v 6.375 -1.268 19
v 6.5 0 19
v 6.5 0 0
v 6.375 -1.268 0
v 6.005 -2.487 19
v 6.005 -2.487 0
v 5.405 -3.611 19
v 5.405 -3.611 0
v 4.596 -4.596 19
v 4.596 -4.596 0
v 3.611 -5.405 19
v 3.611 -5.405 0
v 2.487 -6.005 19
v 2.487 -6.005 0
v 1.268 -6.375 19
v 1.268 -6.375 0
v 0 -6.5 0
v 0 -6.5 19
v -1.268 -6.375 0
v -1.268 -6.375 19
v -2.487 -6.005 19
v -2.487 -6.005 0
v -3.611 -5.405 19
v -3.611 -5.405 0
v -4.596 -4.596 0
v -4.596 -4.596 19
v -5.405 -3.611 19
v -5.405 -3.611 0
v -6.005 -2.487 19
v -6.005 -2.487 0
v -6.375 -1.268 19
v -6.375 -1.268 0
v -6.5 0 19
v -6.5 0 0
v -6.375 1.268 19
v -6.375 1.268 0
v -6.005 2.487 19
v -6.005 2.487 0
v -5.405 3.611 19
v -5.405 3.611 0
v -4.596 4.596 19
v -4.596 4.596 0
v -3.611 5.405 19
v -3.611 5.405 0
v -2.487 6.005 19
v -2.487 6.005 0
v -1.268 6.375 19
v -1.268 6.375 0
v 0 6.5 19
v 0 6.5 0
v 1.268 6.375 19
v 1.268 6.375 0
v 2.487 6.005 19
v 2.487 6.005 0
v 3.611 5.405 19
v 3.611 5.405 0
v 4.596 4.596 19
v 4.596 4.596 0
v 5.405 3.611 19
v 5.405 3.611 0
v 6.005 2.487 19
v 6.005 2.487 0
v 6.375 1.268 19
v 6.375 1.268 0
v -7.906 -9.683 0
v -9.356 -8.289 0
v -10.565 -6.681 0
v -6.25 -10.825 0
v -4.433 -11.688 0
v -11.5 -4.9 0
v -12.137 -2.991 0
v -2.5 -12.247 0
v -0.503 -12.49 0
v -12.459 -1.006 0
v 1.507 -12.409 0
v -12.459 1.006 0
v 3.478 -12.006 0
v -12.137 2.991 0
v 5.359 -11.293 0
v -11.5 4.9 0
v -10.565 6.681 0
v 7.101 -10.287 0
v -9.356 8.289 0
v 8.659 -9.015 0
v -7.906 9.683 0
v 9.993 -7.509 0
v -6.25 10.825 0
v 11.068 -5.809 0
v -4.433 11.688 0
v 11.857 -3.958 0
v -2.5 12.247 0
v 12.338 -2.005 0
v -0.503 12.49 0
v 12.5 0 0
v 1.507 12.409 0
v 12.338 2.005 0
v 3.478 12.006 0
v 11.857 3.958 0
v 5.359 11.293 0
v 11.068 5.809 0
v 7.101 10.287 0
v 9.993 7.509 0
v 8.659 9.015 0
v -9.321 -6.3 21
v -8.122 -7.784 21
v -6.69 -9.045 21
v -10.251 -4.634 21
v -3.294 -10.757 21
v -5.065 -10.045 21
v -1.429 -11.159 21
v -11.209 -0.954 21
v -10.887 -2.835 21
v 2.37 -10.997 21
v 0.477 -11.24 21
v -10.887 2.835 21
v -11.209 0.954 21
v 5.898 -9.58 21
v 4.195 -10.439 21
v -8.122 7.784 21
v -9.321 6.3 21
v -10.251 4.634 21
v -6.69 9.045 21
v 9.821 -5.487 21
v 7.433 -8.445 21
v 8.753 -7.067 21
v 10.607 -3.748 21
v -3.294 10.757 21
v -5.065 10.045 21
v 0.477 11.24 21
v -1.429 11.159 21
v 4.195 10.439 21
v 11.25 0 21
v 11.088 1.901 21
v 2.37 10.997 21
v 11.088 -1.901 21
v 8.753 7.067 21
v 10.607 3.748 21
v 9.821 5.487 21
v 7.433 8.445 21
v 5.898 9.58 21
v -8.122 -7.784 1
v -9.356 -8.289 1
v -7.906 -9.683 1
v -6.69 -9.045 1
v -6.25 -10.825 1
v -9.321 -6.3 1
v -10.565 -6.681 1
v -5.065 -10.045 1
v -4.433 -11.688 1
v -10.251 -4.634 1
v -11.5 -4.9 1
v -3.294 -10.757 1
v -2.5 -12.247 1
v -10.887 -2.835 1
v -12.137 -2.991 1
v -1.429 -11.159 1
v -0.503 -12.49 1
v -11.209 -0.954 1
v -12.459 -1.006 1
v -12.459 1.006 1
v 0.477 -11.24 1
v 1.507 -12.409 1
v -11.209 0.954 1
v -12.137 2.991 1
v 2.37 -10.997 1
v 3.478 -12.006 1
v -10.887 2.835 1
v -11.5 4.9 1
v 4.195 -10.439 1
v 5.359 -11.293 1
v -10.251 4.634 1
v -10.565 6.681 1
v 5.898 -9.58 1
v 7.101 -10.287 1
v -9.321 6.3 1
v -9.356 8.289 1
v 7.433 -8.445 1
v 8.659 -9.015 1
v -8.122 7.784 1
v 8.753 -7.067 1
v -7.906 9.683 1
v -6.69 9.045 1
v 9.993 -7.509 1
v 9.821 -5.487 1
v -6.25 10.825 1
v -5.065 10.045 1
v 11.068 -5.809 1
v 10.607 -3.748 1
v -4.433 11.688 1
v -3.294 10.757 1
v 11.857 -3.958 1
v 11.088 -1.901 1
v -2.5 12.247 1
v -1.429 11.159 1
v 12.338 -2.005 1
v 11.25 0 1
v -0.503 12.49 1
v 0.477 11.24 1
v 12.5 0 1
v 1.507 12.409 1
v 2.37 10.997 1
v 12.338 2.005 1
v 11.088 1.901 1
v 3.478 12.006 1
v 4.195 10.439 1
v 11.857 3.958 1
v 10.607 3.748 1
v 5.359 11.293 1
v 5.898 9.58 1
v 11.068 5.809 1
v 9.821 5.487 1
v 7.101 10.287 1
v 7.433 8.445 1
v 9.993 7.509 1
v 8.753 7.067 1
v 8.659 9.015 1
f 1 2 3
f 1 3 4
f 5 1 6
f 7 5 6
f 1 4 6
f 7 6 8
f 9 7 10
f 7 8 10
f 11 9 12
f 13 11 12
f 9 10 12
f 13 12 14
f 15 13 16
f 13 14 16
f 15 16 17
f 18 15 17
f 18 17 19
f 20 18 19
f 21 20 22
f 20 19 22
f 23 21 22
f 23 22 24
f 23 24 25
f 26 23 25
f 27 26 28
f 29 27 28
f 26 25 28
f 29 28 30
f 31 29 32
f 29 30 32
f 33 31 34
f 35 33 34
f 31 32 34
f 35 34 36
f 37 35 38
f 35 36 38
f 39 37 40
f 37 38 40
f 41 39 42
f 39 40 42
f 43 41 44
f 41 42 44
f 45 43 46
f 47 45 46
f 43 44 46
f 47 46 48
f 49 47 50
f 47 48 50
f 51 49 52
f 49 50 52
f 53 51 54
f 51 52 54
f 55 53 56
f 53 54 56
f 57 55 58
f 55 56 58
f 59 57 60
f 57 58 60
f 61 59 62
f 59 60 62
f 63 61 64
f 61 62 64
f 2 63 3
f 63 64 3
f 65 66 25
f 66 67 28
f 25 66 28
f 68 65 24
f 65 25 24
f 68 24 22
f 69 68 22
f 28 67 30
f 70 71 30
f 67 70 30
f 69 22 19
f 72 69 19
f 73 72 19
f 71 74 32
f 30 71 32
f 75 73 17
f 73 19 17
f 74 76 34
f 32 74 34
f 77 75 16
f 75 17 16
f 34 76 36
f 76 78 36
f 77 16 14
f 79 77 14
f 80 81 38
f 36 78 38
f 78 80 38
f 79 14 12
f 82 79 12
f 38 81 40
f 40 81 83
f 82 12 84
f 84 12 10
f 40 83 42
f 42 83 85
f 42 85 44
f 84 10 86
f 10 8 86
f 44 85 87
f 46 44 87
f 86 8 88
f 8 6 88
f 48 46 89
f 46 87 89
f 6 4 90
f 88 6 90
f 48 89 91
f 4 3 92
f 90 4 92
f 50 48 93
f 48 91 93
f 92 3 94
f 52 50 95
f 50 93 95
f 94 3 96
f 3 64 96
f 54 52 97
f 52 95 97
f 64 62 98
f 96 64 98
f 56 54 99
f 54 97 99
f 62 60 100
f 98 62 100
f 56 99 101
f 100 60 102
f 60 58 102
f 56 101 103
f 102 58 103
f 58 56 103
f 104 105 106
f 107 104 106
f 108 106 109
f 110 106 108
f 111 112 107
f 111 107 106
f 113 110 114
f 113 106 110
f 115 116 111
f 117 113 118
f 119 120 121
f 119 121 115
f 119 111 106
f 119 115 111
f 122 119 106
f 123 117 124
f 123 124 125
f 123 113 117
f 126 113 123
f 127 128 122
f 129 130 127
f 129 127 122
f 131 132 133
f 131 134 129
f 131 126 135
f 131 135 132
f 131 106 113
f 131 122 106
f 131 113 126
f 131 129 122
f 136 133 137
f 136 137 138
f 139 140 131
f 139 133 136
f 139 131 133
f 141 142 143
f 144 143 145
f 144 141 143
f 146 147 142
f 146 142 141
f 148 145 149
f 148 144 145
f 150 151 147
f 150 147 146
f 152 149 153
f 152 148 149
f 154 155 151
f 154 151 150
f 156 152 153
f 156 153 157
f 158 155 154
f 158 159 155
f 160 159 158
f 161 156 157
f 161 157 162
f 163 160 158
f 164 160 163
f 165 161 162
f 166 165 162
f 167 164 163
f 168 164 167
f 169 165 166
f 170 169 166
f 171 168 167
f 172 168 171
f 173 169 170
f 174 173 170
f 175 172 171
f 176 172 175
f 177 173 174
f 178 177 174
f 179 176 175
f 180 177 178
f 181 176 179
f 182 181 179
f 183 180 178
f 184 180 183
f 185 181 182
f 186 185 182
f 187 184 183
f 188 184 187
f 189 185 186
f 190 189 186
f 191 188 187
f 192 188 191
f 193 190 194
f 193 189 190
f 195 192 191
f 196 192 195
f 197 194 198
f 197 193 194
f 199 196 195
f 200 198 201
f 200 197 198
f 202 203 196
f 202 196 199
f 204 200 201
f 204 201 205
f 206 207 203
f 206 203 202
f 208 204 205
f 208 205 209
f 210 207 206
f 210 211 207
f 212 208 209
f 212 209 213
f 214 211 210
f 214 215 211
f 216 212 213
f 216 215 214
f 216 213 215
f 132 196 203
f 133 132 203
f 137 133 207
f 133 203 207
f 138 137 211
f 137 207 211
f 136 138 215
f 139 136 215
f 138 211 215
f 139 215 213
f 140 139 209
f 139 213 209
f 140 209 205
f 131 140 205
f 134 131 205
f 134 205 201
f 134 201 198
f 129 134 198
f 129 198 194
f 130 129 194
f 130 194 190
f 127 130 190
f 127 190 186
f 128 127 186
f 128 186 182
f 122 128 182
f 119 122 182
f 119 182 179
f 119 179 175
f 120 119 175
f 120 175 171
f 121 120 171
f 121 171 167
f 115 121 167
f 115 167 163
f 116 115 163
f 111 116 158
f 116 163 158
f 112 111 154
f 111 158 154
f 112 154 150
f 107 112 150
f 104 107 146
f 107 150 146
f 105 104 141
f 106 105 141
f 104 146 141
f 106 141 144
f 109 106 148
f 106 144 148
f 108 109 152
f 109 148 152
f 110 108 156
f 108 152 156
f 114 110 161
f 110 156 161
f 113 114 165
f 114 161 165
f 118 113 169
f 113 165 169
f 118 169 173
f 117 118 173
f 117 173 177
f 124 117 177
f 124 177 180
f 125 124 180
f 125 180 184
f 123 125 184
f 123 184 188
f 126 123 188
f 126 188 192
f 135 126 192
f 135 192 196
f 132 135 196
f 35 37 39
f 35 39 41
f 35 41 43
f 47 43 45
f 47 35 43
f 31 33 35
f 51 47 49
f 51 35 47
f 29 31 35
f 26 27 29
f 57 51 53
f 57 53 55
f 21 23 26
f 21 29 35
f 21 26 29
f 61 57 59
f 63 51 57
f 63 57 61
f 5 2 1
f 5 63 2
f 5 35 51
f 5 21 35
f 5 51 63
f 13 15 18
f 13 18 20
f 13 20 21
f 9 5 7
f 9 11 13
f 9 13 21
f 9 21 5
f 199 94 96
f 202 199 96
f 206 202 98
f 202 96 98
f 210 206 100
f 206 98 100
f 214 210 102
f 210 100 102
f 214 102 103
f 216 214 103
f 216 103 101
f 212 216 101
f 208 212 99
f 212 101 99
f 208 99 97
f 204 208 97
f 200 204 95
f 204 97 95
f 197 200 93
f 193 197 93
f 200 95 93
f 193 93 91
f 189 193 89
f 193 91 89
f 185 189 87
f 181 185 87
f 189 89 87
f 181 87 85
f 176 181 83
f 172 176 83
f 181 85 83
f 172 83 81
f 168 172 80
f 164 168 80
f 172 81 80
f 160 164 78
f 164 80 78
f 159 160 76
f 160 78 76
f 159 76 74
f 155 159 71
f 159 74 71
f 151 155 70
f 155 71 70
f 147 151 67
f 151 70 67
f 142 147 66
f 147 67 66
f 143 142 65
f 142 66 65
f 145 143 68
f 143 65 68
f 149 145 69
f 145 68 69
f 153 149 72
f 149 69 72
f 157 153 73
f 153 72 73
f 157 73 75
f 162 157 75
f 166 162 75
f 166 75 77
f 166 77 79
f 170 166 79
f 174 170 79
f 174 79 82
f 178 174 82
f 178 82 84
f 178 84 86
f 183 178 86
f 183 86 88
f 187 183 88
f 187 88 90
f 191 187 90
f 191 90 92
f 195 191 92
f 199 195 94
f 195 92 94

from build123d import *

# Parameters (mm, degrees)
F0_R     = 11.25
F1_DEPTH = 21
F0_R_2   = 12.5
F2_DEPTH = 1
F3_R     = 6.5
F4_DEPTH = 19


with BuildPart() as f1:
    # F0 (on Top) → F1 (new body)
    with BuildSketch(Plane.XY):
        Circle(F0_R)
    extrude(amount=F1_DEPTH)

    # F0 (on Top) → F2 (join)
    with BuildSketch(Plane.XY):
        Circle(F0_R_2)
        Circle(F0_R, mode=Mode.SUBTRACT)
    extrude(amount=F2_DEPTH)

    # F3 (on face) → F4 (cut)
    with BuildSketch(Plane(origin=(0, 0, 0), x_dir=(1, 0, 0), z_dir=(0, 0, -1))):
        Circle(F3_R)
    extrude(amount=-F4_DEPTH, mode=Mode.SUBTRACT)


solid = f1.part
